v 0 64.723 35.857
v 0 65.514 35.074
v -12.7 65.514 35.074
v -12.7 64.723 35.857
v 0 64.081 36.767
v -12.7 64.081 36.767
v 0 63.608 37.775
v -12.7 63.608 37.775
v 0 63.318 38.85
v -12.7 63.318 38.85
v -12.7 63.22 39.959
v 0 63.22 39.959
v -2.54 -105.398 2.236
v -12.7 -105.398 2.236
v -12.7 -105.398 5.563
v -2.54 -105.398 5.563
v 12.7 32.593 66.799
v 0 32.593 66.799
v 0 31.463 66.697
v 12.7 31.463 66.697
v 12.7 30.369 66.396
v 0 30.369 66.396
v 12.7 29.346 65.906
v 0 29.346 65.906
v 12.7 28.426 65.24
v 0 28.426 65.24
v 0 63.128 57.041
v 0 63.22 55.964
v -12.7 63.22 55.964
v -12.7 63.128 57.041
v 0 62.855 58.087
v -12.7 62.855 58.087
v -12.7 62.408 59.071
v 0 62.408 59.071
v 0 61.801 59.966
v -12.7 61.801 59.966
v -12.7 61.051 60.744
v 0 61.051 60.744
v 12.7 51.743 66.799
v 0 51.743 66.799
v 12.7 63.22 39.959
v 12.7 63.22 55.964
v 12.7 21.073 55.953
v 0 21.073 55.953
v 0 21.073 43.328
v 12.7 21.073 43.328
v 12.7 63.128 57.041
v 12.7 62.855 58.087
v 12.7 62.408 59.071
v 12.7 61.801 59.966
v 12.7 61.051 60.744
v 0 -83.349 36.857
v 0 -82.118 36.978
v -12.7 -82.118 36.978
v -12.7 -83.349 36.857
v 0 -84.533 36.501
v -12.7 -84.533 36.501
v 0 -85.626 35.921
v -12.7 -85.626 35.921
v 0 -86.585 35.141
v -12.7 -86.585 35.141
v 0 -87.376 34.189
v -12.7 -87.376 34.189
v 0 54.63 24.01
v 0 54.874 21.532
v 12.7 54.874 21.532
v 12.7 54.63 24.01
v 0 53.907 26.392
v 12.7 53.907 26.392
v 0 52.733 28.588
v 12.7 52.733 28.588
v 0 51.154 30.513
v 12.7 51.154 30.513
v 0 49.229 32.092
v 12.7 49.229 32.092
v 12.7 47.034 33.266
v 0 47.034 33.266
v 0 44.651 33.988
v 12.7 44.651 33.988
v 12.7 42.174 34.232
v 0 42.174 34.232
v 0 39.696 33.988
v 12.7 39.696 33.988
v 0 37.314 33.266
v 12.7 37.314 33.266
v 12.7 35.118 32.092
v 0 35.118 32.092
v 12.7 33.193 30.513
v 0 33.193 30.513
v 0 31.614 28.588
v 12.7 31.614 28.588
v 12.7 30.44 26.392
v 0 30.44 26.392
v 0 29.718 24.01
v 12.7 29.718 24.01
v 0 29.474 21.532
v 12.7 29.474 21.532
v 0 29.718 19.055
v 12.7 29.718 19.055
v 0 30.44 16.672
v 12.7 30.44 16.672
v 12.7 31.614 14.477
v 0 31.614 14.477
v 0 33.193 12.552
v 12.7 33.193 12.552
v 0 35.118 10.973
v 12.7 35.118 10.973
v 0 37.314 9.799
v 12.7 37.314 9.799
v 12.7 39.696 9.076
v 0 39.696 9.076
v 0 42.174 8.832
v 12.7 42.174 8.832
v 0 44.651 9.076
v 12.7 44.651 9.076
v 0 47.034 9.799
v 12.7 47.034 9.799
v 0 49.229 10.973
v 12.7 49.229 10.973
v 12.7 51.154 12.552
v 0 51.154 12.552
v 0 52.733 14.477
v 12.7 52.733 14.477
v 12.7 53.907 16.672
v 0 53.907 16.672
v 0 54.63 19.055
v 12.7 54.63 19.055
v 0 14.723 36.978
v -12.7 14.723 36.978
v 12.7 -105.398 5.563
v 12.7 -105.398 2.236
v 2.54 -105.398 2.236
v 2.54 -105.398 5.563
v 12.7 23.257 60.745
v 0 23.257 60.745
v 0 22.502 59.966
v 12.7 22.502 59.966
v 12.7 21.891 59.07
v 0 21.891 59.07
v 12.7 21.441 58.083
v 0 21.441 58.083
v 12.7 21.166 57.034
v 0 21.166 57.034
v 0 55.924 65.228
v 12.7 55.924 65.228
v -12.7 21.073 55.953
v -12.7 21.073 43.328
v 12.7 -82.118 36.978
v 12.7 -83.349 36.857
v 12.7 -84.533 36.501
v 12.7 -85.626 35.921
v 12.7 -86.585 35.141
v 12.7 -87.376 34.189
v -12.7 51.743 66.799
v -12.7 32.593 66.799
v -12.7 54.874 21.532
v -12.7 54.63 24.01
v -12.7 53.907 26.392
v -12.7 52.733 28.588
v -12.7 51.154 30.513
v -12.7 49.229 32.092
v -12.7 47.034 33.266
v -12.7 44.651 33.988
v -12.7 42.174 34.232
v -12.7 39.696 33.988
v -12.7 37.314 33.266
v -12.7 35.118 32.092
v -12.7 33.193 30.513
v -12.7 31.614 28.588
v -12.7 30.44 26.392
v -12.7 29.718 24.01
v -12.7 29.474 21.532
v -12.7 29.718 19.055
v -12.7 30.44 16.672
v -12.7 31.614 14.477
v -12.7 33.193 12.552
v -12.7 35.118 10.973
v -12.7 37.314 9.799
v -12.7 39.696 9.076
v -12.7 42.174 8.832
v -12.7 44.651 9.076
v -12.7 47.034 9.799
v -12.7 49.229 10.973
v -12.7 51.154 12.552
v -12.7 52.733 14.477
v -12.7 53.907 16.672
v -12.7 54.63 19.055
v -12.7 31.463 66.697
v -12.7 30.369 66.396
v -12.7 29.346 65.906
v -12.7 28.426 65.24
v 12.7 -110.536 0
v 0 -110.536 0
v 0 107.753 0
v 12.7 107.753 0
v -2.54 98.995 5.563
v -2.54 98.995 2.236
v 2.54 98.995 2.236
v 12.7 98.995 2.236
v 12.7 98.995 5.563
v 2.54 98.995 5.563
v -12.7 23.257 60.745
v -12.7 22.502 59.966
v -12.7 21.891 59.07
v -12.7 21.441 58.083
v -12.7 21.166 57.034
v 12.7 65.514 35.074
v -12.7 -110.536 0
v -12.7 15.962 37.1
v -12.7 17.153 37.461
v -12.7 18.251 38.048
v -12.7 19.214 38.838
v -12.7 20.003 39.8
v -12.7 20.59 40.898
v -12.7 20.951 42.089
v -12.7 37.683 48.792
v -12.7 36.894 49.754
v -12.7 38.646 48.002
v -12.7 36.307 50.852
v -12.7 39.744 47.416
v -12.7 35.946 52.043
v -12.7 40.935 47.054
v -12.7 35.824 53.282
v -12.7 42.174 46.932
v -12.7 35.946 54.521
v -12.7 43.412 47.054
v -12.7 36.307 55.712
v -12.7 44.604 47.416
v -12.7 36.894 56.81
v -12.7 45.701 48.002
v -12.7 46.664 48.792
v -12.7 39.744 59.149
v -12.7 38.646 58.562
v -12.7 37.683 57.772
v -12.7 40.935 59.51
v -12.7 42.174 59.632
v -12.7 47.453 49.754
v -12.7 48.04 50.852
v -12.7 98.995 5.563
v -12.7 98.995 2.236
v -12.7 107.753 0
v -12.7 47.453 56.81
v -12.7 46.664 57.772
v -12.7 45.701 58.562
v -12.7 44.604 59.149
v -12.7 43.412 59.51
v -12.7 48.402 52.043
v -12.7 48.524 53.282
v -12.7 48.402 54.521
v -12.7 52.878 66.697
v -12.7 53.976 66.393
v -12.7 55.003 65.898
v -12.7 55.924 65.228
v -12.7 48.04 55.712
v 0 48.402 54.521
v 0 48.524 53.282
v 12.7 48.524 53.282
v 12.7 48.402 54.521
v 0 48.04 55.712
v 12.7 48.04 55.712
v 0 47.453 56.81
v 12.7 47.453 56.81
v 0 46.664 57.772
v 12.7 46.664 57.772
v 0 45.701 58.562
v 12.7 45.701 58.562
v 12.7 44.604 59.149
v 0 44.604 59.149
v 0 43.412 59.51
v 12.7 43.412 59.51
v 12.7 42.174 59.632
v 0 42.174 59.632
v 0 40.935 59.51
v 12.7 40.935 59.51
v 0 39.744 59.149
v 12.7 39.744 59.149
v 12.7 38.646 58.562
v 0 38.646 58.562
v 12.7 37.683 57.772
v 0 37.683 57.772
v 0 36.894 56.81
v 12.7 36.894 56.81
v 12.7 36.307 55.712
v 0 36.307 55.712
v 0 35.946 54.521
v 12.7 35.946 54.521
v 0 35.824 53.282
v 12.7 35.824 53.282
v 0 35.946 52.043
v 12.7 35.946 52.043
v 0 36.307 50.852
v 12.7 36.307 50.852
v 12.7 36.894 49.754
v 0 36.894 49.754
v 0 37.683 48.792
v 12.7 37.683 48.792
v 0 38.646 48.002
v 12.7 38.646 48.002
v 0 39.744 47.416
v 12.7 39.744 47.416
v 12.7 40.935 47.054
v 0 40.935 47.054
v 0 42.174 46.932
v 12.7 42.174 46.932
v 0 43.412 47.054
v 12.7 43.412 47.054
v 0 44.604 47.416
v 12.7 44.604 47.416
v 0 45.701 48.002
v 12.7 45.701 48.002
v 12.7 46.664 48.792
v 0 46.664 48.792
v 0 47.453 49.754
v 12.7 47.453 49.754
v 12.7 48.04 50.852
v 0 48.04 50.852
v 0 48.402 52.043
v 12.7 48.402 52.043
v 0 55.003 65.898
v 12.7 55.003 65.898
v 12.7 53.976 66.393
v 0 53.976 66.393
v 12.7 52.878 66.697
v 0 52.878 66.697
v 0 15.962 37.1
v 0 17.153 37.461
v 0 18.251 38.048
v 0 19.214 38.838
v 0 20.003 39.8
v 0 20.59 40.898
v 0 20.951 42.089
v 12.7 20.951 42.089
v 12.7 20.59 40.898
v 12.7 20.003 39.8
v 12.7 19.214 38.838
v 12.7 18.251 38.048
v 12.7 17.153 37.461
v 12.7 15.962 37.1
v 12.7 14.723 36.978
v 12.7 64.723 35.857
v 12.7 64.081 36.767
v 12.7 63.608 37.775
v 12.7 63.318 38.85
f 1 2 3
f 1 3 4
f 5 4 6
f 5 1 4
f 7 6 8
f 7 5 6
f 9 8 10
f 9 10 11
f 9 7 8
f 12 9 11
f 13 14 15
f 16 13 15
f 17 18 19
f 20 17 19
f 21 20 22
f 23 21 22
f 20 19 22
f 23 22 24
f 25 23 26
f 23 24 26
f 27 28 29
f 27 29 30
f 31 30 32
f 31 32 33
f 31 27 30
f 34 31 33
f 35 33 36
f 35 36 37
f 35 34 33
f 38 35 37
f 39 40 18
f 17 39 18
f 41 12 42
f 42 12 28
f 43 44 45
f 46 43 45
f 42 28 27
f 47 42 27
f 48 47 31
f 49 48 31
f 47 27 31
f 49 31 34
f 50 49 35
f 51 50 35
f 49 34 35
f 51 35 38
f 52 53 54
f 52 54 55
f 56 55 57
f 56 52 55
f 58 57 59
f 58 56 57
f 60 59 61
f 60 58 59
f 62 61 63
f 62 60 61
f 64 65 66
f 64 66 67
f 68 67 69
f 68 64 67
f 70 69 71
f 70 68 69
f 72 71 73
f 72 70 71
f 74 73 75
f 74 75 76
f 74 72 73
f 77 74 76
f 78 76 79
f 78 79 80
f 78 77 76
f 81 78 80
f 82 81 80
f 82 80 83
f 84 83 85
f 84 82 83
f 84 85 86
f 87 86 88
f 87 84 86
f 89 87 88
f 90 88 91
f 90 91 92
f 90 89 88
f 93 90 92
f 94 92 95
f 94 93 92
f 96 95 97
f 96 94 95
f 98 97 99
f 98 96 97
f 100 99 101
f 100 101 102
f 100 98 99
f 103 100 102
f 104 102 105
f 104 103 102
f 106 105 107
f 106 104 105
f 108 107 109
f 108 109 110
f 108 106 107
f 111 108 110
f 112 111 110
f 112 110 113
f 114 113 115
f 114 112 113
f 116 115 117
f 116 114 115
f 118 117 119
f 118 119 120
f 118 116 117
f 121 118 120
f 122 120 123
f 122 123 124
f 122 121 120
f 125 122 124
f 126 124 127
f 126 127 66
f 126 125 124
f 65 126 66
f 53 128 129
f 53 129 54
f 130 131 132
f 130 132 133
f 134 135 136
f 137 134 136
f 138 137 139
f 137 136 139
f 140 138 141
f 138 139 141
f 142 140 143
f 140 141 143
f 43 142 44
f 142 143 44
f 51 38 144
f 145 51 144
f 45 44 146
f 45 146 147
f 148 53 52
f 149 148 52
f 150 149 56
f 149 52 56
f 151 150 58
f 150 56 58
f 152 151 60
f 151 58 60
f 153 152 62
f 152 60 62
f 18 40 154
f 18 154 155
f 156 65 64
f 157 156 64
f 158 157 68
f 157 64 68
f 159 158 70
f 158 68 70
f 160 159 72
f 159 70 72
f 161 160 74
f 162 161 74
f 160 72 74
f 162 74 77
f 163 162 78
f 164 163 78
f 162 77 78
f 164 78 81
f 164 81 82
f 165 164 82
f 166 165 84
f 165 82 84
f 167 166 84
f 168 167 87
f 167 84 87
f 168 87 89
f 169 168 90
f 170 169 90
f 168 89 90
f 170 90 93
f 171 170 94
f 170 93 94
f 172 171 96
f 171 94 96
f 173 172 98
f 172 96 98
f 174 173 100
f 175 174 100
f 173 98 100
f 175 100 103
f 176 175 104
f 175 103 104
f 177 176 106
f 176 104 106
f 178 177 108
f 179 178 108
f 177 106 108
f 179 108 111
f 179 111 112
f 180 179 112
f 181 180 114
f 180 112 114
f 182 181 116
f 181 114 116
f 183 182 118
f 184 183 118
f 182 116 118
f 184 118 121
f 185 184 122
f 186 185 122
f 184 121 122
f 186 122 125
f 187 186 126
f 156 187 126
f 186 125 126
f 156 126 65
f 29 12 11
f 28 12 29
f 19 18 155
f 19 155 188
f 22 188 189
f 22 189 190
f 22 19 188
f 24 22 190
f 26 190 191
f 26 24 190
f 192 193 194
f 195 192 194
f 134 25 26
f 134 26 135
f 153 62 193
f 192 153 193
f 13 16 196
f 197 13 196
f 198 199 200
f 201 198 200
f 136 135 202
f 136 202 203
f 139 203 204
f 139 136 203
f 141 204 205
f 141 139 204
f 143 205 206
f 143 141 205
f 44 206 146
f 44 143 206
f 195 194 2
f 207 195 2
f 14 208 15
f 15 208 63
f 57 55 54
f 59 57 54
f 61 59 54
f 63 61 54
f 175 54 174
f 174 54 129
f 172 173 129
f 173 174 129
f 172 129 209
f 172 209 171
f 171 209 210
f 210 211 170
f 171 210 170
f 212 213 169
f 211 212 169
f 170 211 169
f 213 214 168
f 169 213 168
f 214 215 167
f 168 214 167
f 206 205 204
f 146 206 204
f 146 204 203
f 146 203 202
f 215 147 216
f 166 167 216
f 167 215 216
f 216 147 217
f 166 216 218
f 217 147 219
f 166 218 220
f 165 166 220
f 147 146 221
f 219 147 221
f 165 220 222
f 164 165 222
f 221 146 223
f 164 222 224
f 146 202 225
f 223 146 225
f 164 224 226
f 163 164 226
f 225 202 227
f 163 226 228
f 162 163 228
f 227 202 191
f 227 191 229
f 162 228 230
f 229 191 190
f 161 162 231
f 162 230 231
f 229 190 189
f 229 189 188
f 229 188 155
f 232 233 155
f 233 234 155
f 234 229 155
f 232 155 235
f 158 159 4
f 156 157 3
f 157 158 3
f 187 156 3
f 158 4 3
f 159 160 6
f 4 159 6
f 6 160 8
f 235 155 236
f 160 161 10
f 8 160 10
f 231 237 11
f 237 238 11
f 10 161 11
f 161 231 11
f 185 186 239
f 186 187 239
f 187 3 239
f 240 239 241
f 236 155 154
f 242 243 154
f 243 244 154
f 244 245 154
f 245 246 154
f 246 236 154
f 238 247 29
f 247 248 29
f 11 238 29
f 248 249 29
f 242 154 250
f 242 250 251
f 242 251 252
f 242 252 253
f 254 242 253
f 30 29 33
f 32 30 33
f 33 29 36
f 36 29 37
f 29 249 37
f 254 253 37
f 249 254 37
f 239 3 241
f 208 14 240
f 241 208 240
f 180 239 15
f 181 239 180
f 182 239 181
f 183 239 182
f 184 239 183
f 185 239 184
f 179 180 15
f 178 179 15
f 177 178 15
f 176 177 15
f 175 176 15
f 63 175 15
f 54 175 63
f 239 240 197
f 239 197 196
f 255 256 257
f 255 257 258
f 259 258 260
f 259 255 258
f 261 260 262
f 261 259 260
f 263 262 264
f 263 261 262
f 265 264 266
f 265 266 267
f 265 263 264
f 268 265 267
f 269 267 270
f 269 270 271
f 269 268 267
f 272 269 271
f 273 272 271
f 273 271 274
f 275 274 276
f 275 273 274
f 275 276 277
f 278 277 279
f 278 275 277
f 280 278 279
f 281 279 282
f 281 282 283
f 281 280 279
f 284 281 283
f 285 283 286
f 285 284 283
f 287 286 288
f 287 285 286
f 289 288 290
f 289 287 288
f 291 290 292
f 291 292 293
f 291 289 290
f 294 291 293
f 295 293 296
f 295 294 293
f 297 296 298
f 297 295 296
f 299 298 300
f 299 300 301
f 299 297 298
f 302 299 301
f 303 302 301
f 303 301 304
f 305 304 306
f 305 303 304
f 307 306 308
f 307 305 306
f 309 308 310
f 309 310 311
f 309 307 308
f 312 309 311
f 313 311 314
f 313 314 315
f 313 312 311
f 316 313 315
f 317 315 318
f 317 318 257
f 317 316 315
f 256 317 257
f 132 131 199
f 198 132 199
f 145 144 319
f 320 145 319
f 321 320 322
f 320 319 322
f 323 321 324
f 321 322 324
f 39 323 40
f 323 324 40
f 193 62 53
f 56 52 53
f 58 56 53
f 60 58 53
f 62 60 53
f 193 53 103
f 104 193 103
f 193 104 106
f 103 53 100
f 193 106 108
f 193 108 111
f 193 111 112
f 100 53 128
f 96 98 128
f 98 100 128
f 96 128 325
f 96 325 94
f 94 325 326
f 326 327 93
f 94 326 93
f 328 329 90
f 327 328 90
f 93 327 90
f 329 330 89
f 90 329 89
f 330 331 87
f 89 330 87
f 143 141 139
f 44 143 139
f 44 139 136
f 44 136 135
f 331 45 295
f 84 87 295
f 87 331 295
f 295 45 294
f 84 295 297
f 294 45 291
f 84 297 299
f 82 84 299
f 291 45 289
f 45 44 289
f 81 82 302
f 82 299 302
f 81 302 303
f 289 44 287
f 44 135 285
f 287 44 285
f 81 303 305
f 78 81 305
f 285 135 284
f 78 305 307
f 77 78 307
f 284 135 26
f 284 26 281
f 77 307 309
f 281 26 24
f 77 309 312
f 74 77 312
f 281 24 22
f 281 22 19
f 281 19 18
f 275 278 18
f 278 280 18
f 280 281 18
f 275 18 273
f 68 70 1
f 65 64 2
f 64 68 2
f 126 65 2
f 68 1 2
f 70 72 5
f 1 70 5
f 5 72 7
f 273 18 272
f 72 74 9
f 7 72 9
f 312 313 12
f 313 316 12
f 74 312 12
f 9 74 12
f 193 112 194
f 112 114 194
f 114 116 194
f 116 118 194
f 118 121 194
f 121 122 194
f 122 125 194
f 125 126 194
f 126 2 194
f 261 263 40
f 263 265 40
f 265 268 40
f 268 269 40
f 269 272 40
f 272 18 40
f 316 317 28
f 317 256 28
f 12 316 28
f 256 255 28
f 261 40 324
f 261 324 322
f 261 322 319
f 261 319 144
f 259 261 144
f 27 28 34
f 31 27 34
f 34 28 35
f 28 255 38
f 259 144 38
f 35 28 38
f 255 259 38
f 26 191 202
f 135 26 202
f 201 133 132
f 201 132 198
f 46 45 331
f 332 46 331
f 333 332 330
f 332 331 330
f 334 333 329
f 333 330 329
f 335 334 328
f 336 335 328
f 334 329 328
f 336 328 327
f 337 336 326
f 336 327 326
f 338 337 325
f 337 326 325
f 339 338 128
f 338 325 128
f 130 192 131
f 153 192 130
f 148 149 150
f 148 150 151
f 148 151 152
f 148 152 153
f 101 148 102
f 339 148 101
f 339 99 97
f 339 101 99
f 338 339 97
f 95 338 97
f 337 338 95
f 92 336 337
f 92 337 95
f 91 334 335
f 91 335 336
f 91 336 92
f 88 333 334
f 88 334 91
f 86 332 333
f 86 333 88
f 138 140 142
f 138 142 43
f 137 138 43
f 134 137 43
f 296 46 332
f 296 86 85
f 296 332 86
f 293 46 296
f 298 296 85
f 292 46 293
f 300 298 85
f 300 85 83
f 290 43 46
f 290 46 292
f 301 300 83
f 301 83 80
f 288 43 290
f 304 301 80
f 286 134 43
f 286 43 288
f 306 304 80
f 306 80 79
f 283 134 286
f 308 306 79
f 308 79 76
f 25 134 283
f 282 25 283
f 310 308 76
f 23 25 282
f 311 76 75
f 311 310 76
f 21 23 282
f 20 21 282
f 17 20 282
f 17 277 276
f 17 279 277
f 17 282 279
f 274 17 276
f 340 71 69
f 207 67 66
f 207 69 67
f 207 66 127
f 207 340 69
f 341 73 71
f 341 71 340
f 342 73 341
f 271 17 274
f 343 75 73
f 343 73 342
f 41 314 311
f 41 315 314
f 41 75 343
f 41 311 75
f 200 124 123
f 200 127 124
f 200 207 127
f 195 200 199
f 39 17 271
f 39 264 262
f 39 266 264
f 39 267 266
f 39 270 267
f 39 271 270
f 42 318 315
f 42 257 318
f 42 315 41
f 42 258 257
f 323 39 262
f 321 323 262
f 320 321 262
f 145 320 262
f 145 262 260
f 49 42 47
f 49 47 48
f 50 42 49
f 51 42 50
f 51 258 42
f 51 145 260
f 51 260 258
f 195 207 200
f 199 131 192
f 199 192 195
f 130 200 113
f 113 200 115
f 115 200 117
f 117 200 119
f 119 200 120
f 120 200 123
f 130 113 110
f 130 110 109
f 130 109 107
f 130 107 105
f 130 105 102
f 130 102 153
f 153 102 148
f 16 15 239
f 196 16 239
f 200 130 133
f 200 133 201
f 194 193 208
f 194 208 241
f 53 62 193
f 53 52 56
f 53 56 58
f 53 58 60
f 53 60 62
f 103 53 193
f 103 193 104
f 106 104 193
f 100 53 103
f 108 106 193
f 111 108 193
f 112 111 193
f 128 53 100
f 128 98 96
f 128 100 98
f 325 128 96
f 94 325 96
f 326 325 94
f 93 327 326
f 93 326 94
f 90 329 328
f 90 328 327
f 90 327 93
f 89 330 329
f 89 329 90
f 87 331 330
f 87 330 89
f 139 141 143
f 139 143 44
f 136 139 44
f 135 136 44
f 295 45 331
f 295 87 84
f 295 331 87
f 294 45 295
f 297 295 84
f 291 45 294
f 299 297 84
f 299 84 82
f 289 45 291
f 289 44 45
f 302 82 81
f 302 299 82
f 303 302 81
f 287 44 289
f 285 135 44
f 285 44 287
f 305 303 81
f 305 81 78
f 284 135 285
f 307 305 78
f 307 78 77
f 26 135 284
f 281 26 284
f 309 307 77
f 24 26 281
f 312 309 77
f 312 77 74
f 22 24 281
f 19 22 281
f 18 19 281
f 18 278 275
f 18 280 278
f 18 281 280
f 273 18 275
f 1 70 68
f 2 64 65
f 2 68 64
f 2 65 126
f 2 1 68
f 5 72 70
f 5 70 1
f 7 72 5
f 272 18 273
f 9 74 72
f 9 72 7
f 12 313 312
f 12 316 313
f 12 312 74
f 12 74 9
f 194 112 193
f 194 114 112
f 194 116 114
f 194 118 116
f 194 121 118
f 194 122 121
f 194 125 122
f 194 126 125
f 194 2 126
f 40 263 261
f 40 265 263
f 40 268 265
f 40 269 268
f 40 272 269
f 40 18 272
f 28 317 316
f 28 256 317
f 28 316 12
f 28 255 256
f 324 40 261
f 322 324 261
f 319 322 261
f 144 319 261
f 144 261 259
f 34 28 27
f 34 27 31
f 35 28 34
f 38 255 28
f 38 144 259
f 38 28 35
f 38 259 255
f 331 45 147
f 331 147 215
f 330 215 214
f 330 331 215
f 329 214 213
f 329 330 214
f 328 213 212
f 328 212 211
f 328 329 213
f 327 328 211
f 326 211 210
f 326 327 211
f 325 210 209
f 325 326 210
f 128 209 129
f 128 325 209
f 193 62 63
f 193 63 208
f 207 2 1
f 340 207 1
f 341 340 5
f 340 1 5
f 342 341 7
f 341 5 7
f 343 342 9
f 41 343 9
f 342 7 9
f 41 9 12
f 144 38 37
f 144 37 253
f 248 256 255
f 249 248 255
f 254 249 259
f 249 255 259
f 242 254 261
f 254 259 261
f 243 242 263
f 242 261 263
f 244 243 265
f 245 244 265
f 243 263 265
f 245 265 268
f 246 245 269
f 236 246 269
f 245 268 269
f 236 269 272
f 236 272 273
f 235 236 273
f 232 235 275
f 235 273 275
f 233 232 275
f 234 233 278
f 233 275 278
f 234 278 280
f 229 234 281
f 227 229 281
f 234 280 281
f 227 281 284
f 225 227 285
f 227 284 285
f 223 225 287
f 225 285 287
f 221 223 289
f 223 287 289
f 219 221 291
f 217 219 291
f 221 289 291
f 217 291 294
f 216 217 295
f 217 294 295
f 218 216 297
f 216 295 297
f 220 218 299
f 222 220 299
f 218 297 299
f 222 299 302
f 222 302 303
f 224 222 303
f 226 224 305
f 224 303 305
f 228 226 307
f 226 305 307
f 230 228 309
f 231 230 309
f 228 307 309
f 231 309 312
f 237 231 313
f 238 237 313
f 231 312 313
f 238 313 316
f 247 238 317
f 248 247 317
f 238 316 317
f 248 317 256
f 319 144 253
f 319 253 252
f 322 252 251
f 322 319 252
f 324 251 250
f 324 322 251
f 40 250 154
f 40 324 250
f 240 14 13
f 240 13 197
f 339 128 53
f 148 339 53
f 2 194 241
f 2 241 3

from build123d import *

# Parameters (mm, degrees)
F0_R     = 12.7
F0_R_2   = 6.35
F1_DEPTH = 12.7
F2_W     = 204.393248
F2_H     = 3.327842
F3_DEPTH = 10.16


with BuildPart() as f1:
    # F0 (on Right) → F1 (new body)
    with BuildSketch(Plane.YZ):
        with BuildLine():
            Line((-87.375535, 34.189256), (-110.535988, 0))
            Line((-110.535988, 0), (107.75274, 0))
            Line((107.75274, 0), (65.513664, 35.073517))
            ThreePointArc((65.513664, 35.073517), (63.822126, 37.260422), (63.220247, 39.958865))
            Line((63.220247, 39.958865), (63.220247, 55.964406))
            ThreePointArc((63.220247, 55.964406), (62.652536, 58.588837), (61.050913, 60.744001))
            Line((61.050913, 60.744001), (55.924149, 65.228332))
            ThreePointArc((55.924149, 65.228332), (53.976426, 66.393184), (51.743483, 66.798736))
            Line((51.743483, 66.798736), (32.59323, 66.798736))
            ThreePointArc((32.59323, 66.798736), (30.368941, 66.396428), (28.426495, 65.240481))
            Line((28.426495, 65.240481), (23.25669, 60.744997))
            ThreePointArc((23.25669, 60.744997), (21.644962, 58.586096), (21.073425, 55.953253))
            Line((21.073425, 55.953253), (21.073425, 43.327871))
            ThreePointArc((21.073425, 43.327871), (19.213554, 38.837743), (14.723425, 36.977871))
            Line((14.723425, 36.977871), (-82.11825, 36.977871))
            ThreePointArc((-82.11825, 36.977871), (-85.093793, 36.237564), (-87.375535, 34.189256))
        make_face()
        with Locations((42.173627, 21.532319)):
            Circle(F0_R, mode=Mode.SUBTRACT)
        with Locations((42.173627, 53.282319)):
            Circle(F0_R_2, mode=Mode.SUBTRACT)
    extrude(amount=F1_DEPTH)

    # F2 (on face) → F3 (cut)
    with BuildSketch(Plane.YZ.offset(12.7)):
        with Locations((-3.201375, 3.899425)):
            Rectangle(F2_W, F2_H)
    extrude(amount=-F3_DEPTH, mode=Mode.SUBTRACT)


with BuildPart() as f4_1:
    # F4: instance of F1
    add(f1.part.mirror(Plane(origin=(0, -2.3091, 21.867305), x_dir=(0, 1, 0), z_dir=(-1, 0, 0))))


solid = Compound([f1.part, f4_1.part])
